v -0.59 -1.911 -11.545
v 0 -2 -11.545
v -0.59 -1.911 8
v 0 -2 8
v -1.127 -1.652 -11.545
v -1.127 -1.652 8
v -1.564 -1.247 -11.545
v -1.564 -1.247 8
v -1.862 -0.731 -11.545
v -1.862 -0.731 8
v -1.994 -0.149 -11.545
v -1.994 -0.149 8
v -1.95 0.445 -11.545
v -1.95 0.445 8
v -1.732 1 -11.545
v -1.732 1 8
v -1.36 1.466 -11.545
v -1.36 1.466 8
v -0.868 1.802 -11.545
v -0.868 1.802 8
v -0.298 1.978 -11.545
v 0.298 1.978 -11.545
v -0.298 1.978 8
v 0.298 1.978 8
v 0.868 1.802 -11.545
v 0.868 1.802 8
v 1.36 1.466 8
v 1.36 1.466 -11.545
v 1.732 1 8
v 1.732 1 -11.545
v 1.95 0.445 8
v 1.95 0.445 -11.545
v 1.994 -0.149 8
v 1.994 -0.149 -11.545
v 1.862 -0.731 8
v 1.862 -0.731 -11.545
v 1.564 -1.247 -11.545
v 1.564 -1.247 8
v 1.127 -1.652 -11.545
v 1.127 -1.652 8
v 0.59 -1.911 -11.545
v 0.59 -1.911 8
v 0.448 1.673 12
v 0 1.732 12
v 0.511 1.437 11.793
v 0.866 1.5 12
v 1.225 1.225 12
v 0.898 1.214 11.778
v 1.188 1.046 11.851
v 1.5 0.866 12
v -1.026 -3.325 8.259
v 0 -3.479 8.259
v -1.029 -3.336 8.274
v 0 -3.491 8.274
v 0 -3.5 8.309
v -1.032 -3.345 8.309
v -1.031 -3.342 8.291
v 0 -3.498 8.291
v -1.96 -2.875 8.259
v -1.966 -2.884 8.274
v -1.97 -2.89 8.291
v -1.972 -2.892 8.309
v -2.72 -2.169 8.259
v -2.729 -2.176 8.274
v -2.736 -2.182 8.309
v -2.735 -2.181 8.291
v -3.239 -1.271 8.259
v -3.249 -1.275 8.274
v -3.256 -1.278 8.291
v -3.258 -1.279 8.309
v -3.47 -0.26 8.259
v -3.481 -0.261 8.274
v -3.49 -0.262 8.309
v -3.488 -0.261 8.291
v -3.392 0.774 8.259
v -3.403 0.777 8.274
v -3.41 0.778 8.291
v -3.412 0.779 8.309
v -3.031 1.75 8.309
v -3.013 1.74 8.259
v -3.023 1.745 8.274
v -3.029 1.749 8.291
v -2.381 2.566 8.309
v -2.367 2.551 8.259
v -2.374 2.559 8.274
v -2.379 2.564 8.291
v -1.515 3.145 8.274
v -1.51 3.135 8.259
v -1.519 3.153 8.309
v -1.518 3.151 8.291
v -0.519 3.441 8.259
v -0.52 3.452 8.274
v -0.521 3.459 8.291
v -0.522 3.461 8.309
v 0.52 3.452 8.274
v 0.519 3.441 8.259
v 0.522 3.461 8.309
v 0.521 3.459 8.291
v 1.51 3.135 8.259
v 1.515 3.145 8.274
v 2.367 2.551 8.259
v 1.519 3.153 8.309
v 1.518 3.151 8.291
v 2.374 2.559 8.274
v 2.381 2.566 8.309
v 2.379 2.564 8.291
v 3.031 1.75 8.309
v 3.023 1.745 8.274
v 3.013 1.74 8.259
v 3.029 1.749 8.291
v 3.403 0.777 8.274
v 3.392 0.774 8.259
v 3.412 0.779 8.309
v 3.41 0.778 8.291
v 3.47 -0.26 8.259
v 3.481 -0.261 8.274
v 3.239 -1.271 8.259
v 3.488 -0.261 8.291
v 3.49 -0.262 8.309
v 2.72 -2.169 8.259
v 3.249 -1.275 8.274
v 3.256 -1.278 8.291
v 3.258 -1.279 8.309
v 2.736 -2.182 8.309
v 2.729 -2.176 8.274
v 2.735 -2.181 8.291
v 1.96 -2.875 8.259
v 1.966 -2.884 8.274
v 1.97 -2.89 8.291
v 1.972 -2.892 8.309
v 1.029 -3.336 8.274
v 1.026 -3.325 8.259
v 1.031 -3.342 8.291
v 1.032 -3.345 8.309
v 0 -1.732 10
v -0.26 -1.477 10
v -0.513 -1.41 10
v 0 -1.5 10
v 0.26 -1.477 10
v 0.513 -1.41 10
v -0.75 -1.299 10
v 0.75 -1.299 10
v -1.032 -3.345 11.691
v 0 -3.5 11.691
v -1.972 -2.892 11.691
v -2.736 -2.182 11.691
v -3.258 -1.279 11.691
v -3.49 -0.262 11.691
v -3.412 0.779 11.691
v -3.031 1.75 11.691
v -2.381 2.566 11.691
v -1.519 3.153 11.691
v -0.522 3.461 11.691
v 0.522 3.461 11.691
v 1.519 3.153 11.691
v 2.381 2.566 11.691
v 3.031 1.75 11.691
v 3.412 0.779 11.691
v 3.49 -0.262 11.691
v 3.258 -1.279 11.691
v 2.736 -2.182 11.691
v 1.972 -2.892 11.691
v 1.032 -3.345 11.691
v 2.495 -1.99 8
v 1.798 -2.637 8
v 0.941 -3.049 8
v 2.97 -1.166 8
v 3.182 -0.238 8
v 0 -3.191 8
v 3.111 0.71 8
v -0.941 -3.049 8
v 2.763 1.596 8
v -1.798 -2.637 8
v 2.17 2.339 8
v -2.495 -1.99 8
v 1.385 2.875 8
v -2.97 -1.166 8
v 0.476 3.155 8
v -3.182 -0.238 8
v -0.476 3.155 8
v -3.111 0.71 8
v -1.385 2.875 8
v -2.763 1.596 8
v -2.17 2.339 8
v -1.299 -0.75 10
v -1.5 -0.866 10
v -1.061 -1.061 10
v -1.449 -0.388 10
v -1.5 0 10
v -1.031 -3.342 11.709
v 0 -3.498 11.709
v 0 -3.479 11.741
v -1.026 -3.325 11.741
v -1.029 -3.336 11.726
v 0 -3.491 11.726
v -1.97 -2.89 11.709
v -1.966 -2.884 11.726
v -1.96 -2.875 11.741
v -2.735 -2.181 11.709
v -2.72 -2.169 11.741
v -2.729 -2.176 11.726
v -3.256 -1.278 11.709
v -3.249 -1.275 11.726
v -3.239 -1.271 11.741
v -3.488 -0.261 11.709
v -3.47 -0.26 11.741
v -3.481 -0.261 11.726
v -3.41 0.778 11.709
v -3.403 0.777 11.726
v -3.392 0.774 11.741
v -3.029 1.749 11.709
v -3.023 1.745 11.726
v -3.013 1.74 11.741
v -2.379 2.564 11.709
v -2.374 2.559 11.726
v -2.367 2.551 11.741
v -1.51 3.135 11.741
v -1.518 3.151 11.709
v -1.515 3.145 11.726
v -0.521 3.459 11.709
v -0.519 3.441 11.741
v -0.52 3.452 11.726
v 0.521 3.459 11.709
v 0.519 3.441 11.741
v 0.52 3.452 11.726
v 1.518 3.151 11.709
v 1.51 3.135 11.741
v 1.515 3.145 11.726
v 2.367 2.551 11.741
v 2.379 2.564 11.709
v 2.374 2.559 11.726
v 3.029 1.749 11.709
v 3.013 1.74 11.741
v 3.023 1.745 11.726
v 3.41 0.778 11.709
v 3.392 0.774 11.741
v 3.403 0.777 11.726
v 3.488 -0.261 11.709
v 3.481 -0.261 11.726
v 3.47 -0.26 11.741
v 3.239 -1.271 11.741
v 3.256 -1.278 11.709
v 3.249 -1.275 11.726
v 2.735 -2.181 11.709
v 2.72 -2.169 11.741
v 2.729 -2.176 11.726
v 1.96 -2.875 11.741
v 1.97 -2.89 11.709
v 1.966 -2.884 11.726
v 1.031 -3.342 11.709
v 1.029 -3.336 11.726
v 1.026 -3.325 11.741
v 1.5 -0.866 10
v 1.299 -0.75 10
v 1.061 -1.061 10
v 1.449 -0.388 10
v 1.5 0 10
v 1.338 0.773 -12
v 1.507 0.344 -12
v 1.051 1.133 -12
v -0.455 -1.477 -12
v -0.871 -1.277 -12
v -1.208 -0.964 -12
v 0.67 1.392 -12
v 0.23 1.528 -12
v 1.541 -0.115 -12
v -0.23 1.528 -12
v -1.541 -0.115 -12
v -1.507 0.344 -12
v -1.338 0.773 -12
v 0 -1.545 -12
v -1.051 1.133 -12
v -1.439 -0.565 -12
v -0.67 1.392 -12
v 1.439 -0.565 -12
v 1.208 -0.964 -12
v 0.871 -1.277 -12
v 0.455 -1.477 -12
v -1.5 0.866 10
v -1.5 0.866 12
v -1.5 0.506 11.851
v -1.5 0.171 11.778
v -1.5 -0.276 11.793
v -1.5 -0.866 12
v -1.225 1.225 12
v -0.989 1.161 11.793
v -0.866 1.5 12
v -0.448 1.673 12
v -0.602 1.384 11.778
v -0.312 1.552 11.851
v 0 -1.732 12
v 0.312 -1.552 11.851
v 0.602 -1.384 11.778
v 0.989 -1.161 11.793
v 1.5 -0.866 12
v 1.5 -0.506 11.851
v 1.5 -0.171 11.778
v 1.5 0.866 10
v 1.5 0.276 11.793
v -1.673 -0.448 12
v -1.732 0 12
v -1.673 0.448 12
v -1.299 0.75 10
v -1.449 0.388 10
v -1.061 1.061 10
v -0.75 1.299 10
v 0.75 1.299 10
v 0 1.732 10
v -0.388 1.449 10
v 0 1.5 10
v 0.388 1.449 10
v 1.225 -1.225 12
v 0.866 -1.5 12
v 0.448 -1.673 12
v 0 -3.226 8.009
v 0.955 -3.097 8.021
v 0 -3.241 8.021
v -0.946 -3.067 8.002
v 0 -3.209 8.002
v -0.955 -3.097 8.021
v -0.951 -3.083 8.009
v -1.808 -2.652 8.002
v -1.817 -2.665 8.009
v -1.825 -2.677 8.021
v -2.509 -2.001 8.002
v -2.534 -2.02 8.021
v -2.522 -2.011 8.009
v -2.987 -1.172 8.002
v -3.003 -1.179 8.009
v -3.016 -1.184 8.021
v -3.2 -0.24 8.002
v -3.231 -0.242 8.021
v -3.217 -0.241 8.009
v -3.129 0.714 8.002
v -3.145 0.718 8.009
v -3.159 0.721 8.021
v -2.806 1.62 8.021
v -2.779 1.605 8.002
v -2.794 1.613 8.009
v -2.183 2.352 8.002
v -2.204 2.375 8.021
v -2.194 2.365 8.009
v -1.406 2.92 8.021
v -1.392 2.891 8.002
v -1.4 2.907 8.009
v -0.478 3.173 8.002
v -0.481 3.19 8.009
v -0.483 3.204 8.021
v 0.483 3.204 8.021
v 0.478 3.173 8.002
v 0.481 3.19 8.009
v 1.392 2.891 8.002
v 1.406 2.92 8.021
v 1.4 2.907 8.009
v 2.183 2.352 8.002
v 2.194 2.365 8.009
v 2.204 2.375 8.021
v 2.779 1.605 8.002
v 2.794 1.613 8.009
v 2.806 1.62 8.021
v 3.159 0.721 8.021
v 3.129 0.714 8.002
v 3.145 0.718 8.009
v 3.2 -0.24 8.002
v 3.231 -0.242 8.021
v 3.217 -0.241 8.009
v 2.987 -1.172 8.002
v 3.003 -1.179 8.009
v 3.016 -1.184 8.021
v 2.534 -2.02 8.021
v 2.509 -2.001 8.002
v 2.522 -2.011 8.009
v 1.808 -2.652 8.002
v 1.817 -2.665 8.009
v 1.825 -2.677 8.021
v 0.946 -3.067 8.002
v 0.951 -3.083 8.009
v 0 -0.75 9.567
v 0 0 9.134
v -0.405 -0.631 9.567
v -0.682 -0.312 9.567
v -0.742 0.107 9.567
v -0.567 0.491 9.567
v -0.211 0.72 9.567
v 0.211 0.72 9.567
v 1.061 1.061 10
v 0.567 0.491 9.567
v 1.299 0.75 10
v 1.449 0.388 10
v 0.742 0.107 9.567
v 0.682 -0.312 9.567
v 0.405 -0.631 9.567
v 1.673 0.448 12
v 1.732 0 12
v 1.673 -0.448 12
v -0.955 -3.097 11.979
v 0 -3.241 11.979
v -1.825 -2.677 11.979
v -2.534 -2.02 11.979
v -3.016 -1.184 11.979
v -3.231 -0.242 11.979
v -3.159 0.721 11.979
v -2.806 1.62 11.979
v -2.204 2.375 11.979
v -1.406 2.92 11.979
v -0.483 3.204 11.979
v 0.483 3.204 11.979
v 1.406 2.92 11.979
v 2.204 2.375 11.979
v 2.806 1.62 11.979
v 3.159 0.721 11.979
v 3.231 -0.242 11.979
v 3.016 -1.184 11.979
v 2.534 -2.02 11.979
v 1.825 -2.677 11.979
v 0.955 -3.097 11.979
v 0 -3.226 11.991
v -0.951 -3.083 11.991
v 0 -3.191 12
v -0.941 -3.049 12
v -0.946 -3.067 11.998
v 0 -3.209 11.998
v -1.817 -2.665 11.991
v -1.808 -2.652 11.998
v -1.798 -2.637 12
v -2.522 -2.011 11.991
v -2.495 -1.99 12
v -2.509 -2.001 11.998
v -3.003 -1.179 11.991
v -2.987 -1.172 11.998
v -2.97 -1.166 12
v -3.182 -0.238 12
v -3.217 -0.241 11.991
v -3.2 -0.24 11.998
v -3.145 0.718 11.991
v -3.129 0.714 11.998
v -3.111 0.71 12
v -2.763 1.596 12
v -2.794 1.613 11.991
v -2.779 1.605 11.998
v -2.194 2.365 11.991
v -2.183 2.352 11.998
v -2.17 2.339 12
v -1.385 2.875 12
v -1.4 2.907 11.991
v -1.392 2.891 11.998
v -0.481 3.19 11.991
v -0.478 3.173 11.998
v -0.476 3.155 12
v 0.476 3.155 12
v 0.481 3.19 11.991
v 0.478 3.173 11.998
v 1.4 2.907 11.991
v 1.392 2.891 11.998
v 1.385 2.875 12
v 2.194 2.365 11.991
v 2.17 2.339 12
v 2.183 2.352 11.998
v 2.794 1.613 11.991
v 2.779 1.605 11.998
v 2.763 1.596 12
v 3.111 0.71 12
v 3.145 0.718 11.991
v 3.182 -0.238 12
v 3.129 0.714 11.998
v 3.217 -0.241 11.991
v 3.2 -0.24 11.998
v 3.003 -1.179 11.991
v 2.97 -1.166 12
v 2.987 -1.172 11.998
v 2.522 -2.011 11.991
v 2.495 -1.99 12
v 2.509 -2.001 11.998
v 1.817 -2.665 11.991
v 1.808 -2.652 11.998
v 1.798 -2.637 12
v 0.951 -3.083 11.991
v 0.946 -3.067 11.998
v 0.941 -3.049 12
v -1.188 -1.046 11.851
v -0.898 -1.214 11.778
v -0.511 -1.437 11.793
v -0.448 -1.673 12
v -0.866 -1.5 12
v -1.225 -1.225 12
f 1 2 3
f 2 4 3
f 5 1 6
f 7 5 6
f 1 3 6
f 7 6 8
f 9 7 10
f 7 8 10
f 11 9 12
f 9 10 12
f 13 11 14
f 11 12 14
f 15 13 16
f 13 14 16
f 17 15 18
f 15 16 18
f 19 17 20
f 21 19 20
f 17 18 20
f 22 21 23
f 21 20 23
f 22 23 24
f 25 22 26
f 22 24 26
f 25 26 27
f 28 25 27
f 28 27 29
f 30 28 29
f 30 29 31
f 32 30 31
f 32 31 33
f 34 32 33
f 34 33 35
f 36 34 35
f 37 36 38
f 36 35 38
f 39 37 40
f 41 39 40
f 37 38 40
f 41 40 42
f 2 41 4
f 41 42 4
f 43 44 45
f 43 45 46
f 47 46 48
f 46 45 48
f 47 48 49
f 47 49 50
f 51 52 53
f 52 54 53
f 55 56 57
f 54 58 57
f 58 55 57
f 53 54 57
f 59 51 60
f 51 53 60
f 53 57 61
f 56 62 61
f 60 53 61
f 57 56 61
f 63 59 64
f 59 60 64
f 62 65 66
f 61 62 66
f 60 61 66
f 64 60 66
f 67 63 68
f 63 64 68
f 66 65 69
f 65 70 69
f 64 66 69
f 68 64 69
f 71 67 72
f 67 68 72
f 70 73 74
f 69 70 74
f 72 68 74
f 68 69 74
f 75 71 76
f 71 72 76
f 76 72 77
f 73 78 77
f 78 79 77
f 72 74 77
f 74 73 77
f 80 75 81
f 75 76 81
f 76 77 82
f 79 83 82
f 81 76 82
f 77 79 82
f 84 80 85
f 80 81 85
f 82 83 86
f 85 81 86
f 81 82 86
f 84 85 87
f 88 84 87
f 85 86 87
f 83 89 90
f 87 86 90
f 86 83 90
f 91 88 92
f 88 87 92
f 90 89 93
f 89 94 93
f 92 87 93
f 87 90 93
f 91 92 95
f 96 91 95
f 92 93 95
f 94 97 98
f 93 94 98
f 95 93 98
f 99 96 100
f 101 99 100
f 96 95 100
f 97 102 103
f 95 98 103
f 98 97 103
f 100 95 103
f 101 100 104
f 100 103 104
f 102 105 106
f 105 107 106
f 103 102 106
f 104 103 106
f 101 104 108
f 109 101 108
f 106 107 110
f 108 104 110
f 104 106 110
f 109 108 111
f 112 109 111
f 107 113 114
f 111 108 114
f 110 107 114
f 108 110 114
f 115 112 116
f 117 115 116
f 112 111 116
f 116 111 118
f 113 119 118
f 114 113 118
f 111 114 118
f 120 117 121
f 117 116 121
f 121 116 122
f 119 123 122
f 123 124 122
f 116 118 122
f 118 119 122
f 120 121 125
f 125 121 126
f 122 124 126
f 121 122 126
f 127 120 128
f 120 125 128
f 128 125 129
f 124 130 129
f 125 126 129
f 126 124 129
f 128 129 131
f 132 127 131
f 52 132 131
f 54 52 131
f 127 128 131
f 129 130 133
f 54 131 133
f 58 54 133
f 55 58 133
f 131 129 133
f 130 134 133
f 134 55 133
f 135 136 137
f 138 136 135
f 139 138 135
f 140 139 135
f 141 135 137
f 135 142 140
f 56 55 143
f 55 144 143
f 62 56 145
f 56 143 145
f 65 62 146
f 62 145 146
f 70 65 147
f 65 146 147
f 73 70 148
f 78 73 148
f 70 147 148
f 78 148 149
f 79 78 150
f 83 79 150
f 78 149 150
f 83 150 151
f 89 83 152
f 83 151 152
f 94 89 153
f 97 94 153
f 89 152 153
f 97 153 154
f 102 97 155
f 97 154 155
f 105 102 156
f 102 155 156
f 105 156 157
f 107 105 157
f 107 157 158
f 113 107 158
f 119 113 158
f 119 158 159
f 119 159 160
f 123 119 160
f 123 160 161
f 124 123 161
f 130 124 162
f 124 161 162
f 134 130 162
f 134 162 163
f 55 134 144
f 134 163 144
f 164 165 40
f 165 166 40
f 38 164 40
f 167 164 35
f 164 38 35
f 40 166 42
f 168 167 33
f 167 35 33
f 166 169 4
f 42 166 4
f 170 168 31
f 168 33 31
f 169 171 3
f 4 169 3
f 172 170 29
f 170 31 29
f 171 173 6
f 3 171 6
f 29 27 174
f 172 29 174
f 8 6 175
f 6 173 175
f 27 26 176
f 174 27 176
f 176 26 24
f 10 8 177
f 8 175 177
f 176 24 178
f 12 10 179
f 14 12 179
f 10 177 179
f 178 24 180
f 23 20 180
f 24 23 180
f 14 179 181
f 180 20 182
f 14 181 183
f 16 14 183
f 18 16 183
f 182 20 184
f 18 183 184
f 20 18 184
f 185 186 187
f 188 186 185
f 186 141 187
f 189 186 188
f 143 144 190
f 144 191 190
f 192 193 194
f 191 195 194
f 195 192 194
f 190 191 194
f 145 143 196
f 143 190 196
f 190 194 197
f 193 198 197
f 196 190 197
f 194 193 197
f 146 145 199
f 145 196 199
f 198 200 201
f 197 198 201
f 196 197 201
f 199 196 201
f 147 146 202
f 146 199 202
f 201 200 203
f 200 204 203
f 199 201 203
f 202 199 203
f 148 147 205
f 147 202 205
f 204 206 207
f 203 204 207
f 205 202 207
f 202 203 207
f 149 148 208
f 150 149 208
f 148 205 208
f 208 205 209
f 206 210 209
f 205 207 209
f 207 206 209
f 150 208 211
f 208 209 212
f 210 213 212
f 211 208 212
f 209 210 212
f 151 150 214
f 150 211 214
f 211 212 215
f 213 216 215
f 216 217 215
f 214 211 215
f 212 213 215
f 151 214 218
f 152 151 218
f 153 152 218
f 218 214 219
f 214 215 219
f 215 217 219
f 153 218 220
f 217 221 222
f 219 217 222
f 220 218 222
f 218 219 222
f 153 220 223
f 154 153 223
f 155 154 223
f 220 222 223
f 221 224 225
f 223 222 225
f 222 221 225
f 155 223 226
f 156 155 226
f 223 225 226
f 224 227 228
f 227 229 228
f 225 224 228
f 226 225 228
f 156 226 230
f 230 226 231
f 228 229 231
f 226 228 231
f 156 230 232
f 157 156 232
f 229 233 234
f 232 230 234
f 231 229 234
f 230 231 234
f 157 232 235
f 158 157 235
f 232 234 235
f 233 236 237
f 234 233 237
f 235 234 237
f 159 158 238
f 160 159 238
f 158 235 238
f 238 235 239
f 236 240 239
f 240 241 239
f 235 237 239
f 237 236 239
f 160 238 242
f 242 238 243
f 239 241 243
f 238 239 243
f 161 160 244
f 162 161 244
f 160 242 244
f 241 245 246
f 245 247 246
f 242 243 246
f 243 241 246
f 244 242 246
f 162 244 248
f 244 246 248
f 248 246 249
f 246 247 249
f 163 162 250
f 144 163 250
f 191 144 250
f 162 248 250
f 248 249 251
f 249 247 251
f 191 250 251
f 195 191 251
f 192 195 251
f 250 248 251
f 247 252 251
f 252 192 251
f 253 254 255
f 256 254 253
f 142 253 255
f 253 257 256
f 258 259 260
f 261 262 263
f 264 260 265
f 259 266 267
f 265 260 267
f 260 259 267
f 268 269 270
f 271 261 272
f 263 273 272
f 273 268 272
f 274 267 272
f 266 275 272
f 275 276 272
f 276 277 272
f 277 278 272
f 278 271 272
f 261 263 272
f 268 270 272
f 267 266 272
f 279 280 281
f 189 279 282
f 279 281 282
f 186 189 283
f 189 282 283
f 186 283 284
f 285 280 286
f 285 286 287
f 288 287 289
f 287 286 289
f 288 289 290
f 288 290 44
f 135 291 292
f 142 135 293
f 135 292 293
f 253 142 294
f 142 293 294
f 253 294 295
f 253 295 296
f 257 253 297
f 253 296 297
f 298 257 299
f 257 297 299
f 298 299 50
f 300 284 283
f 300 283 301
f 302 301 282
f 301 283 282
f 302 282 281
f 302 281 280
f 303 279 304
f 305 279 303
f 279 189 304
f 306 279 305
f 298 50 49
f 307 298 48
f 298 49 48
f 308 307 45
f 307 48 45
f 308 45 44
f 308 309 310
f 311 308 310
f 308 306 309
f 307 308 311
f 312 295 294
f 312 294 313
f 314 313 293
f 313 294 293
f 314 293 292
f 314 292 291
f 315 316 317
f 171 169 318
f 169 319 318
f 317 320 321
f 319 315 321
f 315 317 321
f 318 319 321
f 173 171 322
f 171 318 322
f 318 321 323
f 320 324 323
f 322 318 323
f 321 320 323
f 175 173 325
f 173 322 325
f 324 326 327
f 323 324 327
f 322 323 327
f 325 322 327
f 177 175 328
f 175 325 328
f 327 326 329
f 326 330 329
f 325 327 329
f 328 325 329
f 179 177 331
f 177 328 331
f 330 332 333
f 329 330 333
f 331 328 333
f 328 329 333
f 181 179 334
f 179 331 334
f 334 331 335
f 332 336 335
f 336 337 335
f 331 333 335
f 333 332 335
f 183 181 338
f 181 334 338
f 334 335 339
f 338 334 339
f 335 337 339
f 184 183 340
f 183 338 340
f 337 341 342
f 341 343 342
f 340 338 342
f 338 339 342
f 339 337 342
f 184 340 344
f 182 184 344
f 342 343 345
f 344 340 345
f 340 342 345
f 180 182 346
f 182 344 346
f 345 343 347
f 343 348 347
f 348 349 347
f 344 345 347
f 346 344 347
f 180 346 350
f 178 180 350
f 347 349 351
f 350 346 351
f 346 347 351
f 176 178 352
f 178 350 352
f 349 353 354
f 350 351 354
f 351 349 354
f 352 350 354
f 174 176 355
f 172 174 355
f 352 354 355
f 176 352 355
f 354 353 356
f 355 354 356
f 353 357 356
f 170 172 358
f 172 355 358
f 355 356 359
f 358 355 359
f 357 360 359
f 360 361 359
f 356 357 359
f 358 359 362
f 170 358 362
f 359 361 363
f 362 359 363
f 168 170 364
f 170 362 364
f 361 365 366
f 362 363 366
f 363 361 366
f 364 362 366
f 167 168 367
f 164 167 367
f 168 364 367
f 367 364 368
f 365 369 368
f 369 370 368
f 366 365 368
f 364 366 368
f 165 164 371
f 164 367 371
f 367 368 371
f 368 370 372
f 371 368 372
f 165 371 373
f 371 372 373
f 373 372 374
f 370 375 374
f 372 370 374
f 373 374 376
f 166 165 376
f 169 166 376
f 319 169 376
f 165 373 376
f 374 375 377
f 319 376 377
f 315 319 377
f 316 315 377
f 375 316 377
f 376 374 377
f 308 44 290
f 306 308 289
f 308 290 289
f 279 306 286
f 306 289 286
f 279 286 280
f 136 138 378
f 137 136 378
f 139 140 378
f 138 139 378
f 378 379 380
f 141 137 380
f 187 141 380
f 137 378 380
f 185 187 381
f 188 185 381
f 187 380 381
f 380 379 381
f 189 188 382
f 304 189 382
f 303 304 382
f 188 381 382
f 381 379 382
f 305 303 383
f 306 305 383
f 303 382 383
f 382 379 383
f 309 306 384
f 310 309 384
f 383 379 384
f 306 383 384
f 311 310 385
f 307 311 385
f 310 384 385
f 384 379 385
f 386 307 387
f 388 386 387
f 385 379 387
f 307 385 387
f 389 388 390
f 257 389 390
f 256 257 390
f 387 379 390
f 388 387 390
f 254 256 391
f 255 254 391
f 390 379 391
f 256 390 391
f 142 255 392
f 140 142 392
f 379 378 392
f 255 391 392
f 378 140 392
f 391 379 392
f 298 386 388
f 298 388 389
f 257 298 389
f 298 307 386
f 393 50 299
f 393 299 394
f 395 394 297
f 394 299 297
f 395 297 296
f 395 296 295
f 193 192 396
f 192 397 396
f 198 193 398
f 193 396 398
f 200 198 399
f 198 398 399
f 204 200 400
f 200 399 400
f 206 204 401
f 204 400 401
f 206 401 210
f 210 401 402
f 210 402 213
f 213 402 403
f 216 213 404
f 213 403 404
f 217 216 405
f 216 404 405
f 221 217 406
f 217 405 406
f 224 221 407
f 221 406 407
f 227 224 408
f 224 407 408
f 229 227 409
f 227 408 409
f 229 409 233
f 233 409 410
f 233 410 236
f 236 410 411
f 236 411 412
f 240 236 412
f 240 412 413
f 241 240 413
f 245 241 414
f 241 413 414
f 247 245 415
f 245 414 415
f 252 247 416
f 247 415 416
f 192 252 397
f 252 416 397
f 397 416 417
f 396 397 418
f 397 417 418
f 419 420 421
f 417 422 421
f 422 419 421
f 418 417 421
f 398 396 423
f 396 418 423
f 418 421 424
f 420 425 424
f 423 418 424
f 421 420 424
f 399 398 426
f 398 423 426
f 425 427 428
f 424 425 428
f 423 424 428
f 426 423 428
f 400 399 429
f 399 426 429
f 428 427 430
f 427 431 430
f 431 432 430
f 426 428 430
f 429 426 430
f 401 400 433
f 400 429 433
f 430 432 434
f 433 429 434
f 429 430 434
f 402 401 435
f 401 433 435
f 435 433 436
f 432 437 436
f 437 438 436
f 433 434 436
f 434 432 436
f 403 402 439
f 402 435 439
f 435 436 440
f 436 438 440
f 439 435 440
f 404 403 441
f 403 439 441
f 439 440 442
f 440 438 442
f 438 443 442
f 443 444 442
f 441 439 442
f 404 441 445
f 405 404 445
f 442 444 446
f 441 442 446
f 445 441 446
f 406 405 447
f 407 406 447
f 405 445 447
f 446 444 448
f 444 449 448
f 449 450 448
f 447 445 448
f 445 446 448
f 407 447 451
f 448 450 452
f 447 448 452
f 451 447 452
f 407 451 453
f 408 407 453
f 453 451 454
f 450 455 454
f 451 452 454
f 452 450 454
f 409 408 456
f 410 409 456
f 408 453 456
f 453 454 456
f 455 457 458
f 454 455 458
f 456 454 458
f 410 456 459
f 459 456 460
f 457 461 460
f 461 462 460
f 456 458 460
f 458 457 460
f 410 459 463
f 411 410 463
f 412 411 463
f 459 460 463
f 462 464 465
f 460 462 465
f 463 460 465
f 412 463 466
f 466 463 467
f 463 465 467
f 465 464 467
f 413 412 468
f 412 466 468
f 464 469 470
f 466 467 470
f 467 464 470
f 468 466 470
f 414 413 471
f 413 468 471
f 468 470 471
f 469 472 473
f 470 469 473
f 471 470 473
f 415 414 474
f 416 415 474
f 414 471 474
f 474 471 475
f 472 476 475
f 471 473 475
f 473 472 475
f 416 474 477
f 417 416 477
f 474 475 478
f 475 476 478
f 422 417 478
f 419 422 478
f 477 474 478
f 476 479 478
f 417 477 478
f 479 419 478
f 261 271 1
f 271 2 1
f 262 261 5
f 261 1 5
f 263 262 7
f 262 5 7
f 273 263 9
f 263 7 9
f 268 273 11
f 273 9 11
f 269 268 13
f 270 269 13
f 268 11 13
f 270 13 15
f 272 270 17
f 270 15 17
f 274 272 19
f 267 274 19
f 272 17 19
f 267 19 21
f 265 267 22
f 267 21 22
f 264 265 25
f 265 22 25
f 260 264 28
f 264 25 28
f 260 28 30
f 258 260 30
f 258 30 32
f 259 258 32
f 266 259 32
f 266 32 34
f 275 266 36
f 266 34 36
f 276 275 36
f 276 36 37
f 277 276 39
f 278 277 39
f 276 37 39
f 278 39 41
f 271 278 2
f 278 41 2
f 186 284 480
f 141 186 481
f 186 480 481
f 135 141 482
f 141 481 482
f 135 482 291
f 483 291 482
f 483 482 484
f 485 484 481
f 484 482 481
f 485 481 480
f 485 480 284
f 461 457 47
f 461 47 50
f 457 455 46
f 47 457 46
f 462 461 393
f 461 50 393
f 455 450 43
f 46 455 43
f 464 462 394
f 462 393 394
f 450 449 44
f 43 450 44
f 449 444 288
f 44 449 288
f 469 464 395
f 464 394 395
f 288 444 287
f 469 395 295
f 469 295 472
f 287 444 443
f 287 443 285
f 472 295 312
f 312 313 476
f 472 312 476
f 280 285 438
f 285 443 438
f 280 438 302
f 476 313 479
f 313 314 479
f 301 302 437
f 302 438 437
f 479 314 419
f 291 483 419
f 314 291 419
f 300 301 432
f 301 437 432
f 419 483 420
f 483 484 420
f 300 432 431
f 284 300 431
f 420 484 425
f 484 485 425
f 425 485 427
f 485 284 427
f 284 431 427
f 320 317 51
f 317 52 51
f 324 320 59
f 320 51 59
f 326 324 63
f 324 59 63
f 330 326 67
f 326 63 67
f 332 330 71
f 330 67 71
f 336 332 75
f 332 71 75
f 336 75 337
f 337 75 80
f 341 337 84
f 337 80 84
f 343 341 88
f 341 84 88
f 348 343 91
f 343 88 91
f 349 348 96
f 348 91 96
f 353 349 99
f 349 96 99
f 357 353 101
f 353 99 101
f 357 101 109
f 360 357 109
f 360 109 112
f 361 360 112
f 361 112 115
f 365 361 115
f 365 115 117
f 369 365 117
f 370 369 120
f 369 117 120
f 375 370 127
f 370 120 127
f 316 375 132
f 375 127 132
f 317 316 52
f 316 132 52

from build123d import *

# Parameters (mm, degrees)
CUT_EXTRUDE1_DEPTH = 2


with BuildPart() as part:
    # Sketch3 → Revolve1 (revolve)
    with BuildSketch(Plane(origin=(0, 0, 0), x_dir=(0, 0, -1), z_dir=(1, 0, 0)), mode=Mode.PRIVATE) as revolve1_sk:
        with BuildLine():
            Line((-12, 3.191005051), (-12, 1.5))
            Line((-12, 1.5), (-10, 1.5))
            Line((-10, 1.5), (-10, 0))
            Line((-10, 0), (12, 0))
            Line((12, 0), (12, 1.545336663))
            Line((12, 1.545336663), (11.545336663, 2))
            Line((11.545336663, 2), (-8, 2))
            Line((-8, 2), (-8, 3.191005051))
            ThreePointArc((-8, 3.191005051), (-8.005328433, 3.217792891), (-8.020502525, 3.240502525))
            Line((-8.020502525, 3.240502525), (-8.259497475, 3.479497475))
            ThreePointArc((-8.259497475, 3.479497475), (-8.282207109, 3.494671567), (-8.308994949, 3.5))
            Line((-8.308994949, 3.5), (-11.691005051, 3.5))
            ThreePointArc((-11.691005051, 3.5), (-11.717792891, 3.494671567), (-11.740502525, 3.479497475))
            Line((-11.740502525, 3.479497475), (-11.979497475, 3.240502525))
            ThreePointArc((-11.979497475, 3.240502525), (-11.994671567, 3.217792891), (-12, 3.191005051))
        make_face()
    revolve(revolve1_sk.sketch.rotate(Axis((0, 0, 12), (0, 0, -1)), 180), axis=Axis((0, 0, 12), (0, 0, -1)))

    # Sketch4 → Cut-Extrude1 (cut)
    with BuildSketch(Plane.XY.offset(12)):
        Polygon((0, 1.732050808), (-1.5, 0.866025404), (-1.5, -0.866025404), (0, -1.732050808), (1.5, -0.866025404), (1.5, 0.866025404), align=None)
    extrude(amount=-CUT_EXTRUDE1_DEPTH, mode=Mode.SUBTRACT)

    # Cut-Extrude2 cone 1 section (through the dimple's axis) → Cut-Extrude2 (revolve, cut)
    with BuildSketch(Plane(origin=(0, 0, 12), x_dir=(0, -1, 0), z_dir=(1, 0, 0))):
        Polygon((0, 0), (1.732050808, 0), (0, 1.732050808), align=None)
    revolve(axis=Axis((0, 0, 12), (0, 0, -1)), mode=Mode.SUBTRACT)

    # Cut-Extrude3 cone 1 section (through the dimple's axis) → Cut-Extrude3 (revolve, cut)
    with BuildSketch(Plane(origin=(0, 0, 10), x_dir=(0, -1, 0), z_dir=(1, 0, 0))):
        Polygon((0, 0), (1.5, 0), (0, 0.866025404), align=None)
    revolve(axis=Axis((0, 0, 10), (0, 0, -1)), mode=Mode.SUBTRACT)


solid = part.part
